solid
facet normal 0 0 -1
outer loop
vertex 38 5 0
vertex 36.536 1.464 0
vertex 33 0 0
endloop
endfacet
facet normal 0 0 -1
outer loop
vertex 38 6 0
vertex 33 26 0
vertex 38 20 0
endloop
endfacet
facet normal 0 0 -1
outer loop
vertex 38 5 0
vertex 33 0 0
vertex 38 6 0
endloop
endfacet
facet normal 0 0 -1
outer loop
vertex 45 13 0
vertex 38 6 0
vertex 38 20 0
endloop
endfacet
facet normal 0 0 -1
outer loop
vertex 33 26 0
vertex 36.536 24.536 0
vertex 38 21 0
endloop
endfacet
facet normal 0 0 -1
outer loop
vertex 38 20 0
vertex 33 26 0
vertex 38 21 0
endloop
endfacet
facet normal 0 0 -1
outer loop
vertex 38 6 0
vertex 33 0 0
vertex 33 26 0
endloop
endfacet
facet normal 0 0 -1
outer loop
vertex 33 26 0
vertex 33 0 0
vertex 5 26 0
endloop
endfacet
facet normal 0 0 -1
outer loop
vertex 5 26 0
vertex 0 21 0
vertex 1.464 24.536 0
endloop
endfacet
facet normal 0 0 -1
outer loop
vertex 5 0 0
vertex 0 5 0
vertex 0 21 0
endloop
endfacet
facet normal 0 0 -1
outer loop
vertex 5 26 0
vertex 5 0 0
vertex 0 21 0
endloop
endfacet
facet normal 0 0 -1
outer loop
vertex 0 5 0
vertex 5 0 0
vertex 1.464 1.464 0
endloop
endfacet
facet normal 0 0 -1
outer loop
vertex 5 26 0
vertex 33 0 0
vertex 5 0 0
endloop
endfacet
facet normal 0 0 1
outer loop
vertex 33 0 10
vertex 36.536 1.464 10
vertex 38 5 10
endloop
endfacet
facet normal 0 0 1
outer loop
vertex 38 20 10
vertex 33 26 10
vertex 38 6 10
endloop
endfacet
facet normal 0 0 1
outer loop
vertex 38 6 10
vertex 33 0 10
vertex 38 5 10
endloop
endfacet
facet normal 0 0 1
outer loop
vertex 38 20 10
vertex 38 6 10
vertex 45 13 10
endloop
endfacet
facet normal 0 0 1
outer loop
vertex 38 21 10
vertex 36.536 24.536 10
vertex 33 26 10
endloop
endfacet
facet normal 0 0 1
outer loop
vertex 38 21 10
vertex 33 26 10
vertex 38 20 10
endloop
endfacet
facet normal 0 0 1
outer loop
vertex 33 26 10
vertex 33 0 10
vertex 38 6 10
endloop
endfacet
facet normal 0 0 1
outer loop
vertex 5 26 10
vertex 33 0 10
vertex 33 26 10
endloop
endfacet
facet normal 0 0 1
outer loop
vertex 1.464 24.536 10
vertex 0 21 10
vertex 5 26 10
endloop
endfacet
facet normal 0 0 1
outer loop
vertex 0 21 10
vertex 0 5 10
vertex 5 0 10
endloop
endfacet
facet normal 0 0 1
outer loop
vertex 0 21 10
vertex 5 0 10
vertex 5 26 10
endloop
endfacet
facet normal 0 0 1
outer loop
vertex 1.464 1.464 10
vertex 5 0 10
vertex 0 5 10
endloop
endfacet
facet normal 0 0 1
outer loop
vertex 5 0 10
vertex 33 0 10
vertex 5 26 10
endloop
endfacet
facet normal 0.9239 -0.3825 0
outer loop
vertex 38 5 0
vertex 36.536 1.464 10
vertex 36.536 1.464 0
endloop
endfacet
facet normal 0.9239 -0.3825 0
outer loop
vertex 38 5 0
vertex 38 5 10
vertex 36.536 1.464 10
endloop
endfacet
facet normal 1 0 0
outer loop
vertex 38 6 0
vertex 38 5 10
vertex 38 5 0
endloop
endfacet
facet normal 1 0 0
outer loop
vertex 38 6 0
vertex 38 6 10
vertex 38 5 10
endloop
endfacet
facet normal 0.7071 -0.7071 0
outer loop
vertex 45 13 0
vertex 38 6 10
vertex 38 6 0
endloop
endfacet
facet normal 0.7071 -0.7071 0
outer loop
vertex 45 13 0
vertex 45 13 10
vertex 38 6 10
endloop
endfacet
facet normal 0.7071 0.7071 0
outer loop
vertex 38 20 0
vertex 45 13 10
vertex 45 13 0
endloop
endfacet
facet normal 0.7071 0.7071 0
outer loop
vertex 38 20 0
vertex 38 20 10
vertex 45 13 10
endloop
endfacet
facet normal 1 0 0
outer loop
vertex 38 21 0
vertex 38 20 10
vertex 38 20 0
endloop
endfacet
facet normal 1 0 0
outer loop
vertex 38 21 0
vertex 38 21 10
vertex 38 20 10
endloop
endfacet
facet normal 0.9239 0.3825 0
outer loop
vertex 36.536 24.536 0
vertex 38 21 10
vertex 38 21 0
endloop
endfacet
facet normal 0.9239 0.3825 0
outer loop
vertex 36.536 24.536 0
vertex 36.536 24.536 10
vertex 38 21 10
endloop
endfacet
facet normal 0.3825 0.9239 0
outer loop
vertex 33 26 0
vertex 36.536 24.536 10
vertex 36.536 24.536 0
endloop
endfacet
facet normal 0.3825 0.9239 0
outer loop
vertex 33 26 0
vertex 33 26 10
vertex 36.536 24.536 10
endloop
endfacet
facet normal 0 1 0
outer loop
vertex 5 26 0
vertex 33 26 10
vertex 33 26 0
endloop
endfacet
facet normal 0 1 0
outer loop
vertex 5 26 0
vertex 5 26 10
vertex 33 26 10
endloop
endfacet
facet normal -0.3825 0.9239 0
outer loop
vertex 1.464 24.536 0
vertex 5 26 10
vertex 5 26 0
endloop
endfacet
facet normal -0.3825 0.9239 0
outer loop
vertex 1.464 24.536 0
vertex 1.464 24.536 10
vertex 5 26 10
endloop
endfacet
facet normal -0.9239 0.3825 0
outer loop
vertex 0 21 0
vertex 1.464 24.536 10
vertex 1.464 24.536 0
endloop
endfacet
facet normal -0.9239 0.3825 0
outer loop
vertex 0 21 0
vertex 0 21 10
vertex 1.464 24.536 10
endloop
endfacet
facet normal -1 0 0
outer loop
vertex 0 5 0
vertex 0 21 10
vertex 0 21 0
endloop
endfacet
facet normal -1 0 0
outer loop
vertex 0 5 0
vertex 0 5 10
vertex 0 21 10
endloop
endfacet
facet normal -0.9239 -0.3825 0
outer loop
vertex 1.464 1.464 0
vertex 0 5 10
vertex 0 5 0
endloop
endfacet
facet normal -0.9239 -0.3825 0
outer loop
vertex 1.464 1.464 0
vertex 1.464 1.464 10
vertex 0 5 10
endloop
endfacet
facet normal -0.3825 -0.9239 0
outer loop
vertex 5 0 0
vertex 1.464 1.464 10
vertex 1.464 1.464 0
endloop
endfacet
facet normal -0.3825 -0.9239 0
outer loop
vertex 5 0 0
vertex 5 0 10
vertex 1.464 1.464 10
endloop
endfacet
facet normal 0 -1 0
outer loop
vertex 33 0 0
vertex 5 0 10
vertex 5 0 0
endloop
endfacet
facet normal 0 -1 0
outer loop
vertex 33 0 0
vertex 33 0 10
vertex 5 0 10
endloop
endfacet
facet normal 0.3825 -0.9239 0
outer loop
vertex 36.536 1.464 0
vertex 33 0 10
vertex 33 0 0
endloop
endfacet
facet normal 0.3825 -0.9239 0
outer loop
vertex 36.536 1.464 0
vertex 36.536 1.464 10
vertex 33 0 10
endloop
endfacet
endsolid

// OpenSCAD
$fn = 32;

// ----------------------------------------------------------------------
// Ratchet pawl: 38 x 26 mm body, beak 7 mm с правого торца
// ----------------------------------------------------------------------

// --- parameters (mm) ---
profile_height = 10;      // extrusion height
profile_points = 15;      // points of the closed outline

profile = [[0, 5], [1.464, 1.464], [5, 0], [33, 0], [36.536, 1.464], [38, 5], [38, 6], [45, 13], [38, 20], [38, 21], [36.536, 24.536], [33, 26], [5, 26], [1.464, 24.536], [0, 21]];  // single closed polygon, 15 points, counter clockwise

// --- the one profile operation ---
linear_extrude(height = profile_height) polygon(points = profile);
